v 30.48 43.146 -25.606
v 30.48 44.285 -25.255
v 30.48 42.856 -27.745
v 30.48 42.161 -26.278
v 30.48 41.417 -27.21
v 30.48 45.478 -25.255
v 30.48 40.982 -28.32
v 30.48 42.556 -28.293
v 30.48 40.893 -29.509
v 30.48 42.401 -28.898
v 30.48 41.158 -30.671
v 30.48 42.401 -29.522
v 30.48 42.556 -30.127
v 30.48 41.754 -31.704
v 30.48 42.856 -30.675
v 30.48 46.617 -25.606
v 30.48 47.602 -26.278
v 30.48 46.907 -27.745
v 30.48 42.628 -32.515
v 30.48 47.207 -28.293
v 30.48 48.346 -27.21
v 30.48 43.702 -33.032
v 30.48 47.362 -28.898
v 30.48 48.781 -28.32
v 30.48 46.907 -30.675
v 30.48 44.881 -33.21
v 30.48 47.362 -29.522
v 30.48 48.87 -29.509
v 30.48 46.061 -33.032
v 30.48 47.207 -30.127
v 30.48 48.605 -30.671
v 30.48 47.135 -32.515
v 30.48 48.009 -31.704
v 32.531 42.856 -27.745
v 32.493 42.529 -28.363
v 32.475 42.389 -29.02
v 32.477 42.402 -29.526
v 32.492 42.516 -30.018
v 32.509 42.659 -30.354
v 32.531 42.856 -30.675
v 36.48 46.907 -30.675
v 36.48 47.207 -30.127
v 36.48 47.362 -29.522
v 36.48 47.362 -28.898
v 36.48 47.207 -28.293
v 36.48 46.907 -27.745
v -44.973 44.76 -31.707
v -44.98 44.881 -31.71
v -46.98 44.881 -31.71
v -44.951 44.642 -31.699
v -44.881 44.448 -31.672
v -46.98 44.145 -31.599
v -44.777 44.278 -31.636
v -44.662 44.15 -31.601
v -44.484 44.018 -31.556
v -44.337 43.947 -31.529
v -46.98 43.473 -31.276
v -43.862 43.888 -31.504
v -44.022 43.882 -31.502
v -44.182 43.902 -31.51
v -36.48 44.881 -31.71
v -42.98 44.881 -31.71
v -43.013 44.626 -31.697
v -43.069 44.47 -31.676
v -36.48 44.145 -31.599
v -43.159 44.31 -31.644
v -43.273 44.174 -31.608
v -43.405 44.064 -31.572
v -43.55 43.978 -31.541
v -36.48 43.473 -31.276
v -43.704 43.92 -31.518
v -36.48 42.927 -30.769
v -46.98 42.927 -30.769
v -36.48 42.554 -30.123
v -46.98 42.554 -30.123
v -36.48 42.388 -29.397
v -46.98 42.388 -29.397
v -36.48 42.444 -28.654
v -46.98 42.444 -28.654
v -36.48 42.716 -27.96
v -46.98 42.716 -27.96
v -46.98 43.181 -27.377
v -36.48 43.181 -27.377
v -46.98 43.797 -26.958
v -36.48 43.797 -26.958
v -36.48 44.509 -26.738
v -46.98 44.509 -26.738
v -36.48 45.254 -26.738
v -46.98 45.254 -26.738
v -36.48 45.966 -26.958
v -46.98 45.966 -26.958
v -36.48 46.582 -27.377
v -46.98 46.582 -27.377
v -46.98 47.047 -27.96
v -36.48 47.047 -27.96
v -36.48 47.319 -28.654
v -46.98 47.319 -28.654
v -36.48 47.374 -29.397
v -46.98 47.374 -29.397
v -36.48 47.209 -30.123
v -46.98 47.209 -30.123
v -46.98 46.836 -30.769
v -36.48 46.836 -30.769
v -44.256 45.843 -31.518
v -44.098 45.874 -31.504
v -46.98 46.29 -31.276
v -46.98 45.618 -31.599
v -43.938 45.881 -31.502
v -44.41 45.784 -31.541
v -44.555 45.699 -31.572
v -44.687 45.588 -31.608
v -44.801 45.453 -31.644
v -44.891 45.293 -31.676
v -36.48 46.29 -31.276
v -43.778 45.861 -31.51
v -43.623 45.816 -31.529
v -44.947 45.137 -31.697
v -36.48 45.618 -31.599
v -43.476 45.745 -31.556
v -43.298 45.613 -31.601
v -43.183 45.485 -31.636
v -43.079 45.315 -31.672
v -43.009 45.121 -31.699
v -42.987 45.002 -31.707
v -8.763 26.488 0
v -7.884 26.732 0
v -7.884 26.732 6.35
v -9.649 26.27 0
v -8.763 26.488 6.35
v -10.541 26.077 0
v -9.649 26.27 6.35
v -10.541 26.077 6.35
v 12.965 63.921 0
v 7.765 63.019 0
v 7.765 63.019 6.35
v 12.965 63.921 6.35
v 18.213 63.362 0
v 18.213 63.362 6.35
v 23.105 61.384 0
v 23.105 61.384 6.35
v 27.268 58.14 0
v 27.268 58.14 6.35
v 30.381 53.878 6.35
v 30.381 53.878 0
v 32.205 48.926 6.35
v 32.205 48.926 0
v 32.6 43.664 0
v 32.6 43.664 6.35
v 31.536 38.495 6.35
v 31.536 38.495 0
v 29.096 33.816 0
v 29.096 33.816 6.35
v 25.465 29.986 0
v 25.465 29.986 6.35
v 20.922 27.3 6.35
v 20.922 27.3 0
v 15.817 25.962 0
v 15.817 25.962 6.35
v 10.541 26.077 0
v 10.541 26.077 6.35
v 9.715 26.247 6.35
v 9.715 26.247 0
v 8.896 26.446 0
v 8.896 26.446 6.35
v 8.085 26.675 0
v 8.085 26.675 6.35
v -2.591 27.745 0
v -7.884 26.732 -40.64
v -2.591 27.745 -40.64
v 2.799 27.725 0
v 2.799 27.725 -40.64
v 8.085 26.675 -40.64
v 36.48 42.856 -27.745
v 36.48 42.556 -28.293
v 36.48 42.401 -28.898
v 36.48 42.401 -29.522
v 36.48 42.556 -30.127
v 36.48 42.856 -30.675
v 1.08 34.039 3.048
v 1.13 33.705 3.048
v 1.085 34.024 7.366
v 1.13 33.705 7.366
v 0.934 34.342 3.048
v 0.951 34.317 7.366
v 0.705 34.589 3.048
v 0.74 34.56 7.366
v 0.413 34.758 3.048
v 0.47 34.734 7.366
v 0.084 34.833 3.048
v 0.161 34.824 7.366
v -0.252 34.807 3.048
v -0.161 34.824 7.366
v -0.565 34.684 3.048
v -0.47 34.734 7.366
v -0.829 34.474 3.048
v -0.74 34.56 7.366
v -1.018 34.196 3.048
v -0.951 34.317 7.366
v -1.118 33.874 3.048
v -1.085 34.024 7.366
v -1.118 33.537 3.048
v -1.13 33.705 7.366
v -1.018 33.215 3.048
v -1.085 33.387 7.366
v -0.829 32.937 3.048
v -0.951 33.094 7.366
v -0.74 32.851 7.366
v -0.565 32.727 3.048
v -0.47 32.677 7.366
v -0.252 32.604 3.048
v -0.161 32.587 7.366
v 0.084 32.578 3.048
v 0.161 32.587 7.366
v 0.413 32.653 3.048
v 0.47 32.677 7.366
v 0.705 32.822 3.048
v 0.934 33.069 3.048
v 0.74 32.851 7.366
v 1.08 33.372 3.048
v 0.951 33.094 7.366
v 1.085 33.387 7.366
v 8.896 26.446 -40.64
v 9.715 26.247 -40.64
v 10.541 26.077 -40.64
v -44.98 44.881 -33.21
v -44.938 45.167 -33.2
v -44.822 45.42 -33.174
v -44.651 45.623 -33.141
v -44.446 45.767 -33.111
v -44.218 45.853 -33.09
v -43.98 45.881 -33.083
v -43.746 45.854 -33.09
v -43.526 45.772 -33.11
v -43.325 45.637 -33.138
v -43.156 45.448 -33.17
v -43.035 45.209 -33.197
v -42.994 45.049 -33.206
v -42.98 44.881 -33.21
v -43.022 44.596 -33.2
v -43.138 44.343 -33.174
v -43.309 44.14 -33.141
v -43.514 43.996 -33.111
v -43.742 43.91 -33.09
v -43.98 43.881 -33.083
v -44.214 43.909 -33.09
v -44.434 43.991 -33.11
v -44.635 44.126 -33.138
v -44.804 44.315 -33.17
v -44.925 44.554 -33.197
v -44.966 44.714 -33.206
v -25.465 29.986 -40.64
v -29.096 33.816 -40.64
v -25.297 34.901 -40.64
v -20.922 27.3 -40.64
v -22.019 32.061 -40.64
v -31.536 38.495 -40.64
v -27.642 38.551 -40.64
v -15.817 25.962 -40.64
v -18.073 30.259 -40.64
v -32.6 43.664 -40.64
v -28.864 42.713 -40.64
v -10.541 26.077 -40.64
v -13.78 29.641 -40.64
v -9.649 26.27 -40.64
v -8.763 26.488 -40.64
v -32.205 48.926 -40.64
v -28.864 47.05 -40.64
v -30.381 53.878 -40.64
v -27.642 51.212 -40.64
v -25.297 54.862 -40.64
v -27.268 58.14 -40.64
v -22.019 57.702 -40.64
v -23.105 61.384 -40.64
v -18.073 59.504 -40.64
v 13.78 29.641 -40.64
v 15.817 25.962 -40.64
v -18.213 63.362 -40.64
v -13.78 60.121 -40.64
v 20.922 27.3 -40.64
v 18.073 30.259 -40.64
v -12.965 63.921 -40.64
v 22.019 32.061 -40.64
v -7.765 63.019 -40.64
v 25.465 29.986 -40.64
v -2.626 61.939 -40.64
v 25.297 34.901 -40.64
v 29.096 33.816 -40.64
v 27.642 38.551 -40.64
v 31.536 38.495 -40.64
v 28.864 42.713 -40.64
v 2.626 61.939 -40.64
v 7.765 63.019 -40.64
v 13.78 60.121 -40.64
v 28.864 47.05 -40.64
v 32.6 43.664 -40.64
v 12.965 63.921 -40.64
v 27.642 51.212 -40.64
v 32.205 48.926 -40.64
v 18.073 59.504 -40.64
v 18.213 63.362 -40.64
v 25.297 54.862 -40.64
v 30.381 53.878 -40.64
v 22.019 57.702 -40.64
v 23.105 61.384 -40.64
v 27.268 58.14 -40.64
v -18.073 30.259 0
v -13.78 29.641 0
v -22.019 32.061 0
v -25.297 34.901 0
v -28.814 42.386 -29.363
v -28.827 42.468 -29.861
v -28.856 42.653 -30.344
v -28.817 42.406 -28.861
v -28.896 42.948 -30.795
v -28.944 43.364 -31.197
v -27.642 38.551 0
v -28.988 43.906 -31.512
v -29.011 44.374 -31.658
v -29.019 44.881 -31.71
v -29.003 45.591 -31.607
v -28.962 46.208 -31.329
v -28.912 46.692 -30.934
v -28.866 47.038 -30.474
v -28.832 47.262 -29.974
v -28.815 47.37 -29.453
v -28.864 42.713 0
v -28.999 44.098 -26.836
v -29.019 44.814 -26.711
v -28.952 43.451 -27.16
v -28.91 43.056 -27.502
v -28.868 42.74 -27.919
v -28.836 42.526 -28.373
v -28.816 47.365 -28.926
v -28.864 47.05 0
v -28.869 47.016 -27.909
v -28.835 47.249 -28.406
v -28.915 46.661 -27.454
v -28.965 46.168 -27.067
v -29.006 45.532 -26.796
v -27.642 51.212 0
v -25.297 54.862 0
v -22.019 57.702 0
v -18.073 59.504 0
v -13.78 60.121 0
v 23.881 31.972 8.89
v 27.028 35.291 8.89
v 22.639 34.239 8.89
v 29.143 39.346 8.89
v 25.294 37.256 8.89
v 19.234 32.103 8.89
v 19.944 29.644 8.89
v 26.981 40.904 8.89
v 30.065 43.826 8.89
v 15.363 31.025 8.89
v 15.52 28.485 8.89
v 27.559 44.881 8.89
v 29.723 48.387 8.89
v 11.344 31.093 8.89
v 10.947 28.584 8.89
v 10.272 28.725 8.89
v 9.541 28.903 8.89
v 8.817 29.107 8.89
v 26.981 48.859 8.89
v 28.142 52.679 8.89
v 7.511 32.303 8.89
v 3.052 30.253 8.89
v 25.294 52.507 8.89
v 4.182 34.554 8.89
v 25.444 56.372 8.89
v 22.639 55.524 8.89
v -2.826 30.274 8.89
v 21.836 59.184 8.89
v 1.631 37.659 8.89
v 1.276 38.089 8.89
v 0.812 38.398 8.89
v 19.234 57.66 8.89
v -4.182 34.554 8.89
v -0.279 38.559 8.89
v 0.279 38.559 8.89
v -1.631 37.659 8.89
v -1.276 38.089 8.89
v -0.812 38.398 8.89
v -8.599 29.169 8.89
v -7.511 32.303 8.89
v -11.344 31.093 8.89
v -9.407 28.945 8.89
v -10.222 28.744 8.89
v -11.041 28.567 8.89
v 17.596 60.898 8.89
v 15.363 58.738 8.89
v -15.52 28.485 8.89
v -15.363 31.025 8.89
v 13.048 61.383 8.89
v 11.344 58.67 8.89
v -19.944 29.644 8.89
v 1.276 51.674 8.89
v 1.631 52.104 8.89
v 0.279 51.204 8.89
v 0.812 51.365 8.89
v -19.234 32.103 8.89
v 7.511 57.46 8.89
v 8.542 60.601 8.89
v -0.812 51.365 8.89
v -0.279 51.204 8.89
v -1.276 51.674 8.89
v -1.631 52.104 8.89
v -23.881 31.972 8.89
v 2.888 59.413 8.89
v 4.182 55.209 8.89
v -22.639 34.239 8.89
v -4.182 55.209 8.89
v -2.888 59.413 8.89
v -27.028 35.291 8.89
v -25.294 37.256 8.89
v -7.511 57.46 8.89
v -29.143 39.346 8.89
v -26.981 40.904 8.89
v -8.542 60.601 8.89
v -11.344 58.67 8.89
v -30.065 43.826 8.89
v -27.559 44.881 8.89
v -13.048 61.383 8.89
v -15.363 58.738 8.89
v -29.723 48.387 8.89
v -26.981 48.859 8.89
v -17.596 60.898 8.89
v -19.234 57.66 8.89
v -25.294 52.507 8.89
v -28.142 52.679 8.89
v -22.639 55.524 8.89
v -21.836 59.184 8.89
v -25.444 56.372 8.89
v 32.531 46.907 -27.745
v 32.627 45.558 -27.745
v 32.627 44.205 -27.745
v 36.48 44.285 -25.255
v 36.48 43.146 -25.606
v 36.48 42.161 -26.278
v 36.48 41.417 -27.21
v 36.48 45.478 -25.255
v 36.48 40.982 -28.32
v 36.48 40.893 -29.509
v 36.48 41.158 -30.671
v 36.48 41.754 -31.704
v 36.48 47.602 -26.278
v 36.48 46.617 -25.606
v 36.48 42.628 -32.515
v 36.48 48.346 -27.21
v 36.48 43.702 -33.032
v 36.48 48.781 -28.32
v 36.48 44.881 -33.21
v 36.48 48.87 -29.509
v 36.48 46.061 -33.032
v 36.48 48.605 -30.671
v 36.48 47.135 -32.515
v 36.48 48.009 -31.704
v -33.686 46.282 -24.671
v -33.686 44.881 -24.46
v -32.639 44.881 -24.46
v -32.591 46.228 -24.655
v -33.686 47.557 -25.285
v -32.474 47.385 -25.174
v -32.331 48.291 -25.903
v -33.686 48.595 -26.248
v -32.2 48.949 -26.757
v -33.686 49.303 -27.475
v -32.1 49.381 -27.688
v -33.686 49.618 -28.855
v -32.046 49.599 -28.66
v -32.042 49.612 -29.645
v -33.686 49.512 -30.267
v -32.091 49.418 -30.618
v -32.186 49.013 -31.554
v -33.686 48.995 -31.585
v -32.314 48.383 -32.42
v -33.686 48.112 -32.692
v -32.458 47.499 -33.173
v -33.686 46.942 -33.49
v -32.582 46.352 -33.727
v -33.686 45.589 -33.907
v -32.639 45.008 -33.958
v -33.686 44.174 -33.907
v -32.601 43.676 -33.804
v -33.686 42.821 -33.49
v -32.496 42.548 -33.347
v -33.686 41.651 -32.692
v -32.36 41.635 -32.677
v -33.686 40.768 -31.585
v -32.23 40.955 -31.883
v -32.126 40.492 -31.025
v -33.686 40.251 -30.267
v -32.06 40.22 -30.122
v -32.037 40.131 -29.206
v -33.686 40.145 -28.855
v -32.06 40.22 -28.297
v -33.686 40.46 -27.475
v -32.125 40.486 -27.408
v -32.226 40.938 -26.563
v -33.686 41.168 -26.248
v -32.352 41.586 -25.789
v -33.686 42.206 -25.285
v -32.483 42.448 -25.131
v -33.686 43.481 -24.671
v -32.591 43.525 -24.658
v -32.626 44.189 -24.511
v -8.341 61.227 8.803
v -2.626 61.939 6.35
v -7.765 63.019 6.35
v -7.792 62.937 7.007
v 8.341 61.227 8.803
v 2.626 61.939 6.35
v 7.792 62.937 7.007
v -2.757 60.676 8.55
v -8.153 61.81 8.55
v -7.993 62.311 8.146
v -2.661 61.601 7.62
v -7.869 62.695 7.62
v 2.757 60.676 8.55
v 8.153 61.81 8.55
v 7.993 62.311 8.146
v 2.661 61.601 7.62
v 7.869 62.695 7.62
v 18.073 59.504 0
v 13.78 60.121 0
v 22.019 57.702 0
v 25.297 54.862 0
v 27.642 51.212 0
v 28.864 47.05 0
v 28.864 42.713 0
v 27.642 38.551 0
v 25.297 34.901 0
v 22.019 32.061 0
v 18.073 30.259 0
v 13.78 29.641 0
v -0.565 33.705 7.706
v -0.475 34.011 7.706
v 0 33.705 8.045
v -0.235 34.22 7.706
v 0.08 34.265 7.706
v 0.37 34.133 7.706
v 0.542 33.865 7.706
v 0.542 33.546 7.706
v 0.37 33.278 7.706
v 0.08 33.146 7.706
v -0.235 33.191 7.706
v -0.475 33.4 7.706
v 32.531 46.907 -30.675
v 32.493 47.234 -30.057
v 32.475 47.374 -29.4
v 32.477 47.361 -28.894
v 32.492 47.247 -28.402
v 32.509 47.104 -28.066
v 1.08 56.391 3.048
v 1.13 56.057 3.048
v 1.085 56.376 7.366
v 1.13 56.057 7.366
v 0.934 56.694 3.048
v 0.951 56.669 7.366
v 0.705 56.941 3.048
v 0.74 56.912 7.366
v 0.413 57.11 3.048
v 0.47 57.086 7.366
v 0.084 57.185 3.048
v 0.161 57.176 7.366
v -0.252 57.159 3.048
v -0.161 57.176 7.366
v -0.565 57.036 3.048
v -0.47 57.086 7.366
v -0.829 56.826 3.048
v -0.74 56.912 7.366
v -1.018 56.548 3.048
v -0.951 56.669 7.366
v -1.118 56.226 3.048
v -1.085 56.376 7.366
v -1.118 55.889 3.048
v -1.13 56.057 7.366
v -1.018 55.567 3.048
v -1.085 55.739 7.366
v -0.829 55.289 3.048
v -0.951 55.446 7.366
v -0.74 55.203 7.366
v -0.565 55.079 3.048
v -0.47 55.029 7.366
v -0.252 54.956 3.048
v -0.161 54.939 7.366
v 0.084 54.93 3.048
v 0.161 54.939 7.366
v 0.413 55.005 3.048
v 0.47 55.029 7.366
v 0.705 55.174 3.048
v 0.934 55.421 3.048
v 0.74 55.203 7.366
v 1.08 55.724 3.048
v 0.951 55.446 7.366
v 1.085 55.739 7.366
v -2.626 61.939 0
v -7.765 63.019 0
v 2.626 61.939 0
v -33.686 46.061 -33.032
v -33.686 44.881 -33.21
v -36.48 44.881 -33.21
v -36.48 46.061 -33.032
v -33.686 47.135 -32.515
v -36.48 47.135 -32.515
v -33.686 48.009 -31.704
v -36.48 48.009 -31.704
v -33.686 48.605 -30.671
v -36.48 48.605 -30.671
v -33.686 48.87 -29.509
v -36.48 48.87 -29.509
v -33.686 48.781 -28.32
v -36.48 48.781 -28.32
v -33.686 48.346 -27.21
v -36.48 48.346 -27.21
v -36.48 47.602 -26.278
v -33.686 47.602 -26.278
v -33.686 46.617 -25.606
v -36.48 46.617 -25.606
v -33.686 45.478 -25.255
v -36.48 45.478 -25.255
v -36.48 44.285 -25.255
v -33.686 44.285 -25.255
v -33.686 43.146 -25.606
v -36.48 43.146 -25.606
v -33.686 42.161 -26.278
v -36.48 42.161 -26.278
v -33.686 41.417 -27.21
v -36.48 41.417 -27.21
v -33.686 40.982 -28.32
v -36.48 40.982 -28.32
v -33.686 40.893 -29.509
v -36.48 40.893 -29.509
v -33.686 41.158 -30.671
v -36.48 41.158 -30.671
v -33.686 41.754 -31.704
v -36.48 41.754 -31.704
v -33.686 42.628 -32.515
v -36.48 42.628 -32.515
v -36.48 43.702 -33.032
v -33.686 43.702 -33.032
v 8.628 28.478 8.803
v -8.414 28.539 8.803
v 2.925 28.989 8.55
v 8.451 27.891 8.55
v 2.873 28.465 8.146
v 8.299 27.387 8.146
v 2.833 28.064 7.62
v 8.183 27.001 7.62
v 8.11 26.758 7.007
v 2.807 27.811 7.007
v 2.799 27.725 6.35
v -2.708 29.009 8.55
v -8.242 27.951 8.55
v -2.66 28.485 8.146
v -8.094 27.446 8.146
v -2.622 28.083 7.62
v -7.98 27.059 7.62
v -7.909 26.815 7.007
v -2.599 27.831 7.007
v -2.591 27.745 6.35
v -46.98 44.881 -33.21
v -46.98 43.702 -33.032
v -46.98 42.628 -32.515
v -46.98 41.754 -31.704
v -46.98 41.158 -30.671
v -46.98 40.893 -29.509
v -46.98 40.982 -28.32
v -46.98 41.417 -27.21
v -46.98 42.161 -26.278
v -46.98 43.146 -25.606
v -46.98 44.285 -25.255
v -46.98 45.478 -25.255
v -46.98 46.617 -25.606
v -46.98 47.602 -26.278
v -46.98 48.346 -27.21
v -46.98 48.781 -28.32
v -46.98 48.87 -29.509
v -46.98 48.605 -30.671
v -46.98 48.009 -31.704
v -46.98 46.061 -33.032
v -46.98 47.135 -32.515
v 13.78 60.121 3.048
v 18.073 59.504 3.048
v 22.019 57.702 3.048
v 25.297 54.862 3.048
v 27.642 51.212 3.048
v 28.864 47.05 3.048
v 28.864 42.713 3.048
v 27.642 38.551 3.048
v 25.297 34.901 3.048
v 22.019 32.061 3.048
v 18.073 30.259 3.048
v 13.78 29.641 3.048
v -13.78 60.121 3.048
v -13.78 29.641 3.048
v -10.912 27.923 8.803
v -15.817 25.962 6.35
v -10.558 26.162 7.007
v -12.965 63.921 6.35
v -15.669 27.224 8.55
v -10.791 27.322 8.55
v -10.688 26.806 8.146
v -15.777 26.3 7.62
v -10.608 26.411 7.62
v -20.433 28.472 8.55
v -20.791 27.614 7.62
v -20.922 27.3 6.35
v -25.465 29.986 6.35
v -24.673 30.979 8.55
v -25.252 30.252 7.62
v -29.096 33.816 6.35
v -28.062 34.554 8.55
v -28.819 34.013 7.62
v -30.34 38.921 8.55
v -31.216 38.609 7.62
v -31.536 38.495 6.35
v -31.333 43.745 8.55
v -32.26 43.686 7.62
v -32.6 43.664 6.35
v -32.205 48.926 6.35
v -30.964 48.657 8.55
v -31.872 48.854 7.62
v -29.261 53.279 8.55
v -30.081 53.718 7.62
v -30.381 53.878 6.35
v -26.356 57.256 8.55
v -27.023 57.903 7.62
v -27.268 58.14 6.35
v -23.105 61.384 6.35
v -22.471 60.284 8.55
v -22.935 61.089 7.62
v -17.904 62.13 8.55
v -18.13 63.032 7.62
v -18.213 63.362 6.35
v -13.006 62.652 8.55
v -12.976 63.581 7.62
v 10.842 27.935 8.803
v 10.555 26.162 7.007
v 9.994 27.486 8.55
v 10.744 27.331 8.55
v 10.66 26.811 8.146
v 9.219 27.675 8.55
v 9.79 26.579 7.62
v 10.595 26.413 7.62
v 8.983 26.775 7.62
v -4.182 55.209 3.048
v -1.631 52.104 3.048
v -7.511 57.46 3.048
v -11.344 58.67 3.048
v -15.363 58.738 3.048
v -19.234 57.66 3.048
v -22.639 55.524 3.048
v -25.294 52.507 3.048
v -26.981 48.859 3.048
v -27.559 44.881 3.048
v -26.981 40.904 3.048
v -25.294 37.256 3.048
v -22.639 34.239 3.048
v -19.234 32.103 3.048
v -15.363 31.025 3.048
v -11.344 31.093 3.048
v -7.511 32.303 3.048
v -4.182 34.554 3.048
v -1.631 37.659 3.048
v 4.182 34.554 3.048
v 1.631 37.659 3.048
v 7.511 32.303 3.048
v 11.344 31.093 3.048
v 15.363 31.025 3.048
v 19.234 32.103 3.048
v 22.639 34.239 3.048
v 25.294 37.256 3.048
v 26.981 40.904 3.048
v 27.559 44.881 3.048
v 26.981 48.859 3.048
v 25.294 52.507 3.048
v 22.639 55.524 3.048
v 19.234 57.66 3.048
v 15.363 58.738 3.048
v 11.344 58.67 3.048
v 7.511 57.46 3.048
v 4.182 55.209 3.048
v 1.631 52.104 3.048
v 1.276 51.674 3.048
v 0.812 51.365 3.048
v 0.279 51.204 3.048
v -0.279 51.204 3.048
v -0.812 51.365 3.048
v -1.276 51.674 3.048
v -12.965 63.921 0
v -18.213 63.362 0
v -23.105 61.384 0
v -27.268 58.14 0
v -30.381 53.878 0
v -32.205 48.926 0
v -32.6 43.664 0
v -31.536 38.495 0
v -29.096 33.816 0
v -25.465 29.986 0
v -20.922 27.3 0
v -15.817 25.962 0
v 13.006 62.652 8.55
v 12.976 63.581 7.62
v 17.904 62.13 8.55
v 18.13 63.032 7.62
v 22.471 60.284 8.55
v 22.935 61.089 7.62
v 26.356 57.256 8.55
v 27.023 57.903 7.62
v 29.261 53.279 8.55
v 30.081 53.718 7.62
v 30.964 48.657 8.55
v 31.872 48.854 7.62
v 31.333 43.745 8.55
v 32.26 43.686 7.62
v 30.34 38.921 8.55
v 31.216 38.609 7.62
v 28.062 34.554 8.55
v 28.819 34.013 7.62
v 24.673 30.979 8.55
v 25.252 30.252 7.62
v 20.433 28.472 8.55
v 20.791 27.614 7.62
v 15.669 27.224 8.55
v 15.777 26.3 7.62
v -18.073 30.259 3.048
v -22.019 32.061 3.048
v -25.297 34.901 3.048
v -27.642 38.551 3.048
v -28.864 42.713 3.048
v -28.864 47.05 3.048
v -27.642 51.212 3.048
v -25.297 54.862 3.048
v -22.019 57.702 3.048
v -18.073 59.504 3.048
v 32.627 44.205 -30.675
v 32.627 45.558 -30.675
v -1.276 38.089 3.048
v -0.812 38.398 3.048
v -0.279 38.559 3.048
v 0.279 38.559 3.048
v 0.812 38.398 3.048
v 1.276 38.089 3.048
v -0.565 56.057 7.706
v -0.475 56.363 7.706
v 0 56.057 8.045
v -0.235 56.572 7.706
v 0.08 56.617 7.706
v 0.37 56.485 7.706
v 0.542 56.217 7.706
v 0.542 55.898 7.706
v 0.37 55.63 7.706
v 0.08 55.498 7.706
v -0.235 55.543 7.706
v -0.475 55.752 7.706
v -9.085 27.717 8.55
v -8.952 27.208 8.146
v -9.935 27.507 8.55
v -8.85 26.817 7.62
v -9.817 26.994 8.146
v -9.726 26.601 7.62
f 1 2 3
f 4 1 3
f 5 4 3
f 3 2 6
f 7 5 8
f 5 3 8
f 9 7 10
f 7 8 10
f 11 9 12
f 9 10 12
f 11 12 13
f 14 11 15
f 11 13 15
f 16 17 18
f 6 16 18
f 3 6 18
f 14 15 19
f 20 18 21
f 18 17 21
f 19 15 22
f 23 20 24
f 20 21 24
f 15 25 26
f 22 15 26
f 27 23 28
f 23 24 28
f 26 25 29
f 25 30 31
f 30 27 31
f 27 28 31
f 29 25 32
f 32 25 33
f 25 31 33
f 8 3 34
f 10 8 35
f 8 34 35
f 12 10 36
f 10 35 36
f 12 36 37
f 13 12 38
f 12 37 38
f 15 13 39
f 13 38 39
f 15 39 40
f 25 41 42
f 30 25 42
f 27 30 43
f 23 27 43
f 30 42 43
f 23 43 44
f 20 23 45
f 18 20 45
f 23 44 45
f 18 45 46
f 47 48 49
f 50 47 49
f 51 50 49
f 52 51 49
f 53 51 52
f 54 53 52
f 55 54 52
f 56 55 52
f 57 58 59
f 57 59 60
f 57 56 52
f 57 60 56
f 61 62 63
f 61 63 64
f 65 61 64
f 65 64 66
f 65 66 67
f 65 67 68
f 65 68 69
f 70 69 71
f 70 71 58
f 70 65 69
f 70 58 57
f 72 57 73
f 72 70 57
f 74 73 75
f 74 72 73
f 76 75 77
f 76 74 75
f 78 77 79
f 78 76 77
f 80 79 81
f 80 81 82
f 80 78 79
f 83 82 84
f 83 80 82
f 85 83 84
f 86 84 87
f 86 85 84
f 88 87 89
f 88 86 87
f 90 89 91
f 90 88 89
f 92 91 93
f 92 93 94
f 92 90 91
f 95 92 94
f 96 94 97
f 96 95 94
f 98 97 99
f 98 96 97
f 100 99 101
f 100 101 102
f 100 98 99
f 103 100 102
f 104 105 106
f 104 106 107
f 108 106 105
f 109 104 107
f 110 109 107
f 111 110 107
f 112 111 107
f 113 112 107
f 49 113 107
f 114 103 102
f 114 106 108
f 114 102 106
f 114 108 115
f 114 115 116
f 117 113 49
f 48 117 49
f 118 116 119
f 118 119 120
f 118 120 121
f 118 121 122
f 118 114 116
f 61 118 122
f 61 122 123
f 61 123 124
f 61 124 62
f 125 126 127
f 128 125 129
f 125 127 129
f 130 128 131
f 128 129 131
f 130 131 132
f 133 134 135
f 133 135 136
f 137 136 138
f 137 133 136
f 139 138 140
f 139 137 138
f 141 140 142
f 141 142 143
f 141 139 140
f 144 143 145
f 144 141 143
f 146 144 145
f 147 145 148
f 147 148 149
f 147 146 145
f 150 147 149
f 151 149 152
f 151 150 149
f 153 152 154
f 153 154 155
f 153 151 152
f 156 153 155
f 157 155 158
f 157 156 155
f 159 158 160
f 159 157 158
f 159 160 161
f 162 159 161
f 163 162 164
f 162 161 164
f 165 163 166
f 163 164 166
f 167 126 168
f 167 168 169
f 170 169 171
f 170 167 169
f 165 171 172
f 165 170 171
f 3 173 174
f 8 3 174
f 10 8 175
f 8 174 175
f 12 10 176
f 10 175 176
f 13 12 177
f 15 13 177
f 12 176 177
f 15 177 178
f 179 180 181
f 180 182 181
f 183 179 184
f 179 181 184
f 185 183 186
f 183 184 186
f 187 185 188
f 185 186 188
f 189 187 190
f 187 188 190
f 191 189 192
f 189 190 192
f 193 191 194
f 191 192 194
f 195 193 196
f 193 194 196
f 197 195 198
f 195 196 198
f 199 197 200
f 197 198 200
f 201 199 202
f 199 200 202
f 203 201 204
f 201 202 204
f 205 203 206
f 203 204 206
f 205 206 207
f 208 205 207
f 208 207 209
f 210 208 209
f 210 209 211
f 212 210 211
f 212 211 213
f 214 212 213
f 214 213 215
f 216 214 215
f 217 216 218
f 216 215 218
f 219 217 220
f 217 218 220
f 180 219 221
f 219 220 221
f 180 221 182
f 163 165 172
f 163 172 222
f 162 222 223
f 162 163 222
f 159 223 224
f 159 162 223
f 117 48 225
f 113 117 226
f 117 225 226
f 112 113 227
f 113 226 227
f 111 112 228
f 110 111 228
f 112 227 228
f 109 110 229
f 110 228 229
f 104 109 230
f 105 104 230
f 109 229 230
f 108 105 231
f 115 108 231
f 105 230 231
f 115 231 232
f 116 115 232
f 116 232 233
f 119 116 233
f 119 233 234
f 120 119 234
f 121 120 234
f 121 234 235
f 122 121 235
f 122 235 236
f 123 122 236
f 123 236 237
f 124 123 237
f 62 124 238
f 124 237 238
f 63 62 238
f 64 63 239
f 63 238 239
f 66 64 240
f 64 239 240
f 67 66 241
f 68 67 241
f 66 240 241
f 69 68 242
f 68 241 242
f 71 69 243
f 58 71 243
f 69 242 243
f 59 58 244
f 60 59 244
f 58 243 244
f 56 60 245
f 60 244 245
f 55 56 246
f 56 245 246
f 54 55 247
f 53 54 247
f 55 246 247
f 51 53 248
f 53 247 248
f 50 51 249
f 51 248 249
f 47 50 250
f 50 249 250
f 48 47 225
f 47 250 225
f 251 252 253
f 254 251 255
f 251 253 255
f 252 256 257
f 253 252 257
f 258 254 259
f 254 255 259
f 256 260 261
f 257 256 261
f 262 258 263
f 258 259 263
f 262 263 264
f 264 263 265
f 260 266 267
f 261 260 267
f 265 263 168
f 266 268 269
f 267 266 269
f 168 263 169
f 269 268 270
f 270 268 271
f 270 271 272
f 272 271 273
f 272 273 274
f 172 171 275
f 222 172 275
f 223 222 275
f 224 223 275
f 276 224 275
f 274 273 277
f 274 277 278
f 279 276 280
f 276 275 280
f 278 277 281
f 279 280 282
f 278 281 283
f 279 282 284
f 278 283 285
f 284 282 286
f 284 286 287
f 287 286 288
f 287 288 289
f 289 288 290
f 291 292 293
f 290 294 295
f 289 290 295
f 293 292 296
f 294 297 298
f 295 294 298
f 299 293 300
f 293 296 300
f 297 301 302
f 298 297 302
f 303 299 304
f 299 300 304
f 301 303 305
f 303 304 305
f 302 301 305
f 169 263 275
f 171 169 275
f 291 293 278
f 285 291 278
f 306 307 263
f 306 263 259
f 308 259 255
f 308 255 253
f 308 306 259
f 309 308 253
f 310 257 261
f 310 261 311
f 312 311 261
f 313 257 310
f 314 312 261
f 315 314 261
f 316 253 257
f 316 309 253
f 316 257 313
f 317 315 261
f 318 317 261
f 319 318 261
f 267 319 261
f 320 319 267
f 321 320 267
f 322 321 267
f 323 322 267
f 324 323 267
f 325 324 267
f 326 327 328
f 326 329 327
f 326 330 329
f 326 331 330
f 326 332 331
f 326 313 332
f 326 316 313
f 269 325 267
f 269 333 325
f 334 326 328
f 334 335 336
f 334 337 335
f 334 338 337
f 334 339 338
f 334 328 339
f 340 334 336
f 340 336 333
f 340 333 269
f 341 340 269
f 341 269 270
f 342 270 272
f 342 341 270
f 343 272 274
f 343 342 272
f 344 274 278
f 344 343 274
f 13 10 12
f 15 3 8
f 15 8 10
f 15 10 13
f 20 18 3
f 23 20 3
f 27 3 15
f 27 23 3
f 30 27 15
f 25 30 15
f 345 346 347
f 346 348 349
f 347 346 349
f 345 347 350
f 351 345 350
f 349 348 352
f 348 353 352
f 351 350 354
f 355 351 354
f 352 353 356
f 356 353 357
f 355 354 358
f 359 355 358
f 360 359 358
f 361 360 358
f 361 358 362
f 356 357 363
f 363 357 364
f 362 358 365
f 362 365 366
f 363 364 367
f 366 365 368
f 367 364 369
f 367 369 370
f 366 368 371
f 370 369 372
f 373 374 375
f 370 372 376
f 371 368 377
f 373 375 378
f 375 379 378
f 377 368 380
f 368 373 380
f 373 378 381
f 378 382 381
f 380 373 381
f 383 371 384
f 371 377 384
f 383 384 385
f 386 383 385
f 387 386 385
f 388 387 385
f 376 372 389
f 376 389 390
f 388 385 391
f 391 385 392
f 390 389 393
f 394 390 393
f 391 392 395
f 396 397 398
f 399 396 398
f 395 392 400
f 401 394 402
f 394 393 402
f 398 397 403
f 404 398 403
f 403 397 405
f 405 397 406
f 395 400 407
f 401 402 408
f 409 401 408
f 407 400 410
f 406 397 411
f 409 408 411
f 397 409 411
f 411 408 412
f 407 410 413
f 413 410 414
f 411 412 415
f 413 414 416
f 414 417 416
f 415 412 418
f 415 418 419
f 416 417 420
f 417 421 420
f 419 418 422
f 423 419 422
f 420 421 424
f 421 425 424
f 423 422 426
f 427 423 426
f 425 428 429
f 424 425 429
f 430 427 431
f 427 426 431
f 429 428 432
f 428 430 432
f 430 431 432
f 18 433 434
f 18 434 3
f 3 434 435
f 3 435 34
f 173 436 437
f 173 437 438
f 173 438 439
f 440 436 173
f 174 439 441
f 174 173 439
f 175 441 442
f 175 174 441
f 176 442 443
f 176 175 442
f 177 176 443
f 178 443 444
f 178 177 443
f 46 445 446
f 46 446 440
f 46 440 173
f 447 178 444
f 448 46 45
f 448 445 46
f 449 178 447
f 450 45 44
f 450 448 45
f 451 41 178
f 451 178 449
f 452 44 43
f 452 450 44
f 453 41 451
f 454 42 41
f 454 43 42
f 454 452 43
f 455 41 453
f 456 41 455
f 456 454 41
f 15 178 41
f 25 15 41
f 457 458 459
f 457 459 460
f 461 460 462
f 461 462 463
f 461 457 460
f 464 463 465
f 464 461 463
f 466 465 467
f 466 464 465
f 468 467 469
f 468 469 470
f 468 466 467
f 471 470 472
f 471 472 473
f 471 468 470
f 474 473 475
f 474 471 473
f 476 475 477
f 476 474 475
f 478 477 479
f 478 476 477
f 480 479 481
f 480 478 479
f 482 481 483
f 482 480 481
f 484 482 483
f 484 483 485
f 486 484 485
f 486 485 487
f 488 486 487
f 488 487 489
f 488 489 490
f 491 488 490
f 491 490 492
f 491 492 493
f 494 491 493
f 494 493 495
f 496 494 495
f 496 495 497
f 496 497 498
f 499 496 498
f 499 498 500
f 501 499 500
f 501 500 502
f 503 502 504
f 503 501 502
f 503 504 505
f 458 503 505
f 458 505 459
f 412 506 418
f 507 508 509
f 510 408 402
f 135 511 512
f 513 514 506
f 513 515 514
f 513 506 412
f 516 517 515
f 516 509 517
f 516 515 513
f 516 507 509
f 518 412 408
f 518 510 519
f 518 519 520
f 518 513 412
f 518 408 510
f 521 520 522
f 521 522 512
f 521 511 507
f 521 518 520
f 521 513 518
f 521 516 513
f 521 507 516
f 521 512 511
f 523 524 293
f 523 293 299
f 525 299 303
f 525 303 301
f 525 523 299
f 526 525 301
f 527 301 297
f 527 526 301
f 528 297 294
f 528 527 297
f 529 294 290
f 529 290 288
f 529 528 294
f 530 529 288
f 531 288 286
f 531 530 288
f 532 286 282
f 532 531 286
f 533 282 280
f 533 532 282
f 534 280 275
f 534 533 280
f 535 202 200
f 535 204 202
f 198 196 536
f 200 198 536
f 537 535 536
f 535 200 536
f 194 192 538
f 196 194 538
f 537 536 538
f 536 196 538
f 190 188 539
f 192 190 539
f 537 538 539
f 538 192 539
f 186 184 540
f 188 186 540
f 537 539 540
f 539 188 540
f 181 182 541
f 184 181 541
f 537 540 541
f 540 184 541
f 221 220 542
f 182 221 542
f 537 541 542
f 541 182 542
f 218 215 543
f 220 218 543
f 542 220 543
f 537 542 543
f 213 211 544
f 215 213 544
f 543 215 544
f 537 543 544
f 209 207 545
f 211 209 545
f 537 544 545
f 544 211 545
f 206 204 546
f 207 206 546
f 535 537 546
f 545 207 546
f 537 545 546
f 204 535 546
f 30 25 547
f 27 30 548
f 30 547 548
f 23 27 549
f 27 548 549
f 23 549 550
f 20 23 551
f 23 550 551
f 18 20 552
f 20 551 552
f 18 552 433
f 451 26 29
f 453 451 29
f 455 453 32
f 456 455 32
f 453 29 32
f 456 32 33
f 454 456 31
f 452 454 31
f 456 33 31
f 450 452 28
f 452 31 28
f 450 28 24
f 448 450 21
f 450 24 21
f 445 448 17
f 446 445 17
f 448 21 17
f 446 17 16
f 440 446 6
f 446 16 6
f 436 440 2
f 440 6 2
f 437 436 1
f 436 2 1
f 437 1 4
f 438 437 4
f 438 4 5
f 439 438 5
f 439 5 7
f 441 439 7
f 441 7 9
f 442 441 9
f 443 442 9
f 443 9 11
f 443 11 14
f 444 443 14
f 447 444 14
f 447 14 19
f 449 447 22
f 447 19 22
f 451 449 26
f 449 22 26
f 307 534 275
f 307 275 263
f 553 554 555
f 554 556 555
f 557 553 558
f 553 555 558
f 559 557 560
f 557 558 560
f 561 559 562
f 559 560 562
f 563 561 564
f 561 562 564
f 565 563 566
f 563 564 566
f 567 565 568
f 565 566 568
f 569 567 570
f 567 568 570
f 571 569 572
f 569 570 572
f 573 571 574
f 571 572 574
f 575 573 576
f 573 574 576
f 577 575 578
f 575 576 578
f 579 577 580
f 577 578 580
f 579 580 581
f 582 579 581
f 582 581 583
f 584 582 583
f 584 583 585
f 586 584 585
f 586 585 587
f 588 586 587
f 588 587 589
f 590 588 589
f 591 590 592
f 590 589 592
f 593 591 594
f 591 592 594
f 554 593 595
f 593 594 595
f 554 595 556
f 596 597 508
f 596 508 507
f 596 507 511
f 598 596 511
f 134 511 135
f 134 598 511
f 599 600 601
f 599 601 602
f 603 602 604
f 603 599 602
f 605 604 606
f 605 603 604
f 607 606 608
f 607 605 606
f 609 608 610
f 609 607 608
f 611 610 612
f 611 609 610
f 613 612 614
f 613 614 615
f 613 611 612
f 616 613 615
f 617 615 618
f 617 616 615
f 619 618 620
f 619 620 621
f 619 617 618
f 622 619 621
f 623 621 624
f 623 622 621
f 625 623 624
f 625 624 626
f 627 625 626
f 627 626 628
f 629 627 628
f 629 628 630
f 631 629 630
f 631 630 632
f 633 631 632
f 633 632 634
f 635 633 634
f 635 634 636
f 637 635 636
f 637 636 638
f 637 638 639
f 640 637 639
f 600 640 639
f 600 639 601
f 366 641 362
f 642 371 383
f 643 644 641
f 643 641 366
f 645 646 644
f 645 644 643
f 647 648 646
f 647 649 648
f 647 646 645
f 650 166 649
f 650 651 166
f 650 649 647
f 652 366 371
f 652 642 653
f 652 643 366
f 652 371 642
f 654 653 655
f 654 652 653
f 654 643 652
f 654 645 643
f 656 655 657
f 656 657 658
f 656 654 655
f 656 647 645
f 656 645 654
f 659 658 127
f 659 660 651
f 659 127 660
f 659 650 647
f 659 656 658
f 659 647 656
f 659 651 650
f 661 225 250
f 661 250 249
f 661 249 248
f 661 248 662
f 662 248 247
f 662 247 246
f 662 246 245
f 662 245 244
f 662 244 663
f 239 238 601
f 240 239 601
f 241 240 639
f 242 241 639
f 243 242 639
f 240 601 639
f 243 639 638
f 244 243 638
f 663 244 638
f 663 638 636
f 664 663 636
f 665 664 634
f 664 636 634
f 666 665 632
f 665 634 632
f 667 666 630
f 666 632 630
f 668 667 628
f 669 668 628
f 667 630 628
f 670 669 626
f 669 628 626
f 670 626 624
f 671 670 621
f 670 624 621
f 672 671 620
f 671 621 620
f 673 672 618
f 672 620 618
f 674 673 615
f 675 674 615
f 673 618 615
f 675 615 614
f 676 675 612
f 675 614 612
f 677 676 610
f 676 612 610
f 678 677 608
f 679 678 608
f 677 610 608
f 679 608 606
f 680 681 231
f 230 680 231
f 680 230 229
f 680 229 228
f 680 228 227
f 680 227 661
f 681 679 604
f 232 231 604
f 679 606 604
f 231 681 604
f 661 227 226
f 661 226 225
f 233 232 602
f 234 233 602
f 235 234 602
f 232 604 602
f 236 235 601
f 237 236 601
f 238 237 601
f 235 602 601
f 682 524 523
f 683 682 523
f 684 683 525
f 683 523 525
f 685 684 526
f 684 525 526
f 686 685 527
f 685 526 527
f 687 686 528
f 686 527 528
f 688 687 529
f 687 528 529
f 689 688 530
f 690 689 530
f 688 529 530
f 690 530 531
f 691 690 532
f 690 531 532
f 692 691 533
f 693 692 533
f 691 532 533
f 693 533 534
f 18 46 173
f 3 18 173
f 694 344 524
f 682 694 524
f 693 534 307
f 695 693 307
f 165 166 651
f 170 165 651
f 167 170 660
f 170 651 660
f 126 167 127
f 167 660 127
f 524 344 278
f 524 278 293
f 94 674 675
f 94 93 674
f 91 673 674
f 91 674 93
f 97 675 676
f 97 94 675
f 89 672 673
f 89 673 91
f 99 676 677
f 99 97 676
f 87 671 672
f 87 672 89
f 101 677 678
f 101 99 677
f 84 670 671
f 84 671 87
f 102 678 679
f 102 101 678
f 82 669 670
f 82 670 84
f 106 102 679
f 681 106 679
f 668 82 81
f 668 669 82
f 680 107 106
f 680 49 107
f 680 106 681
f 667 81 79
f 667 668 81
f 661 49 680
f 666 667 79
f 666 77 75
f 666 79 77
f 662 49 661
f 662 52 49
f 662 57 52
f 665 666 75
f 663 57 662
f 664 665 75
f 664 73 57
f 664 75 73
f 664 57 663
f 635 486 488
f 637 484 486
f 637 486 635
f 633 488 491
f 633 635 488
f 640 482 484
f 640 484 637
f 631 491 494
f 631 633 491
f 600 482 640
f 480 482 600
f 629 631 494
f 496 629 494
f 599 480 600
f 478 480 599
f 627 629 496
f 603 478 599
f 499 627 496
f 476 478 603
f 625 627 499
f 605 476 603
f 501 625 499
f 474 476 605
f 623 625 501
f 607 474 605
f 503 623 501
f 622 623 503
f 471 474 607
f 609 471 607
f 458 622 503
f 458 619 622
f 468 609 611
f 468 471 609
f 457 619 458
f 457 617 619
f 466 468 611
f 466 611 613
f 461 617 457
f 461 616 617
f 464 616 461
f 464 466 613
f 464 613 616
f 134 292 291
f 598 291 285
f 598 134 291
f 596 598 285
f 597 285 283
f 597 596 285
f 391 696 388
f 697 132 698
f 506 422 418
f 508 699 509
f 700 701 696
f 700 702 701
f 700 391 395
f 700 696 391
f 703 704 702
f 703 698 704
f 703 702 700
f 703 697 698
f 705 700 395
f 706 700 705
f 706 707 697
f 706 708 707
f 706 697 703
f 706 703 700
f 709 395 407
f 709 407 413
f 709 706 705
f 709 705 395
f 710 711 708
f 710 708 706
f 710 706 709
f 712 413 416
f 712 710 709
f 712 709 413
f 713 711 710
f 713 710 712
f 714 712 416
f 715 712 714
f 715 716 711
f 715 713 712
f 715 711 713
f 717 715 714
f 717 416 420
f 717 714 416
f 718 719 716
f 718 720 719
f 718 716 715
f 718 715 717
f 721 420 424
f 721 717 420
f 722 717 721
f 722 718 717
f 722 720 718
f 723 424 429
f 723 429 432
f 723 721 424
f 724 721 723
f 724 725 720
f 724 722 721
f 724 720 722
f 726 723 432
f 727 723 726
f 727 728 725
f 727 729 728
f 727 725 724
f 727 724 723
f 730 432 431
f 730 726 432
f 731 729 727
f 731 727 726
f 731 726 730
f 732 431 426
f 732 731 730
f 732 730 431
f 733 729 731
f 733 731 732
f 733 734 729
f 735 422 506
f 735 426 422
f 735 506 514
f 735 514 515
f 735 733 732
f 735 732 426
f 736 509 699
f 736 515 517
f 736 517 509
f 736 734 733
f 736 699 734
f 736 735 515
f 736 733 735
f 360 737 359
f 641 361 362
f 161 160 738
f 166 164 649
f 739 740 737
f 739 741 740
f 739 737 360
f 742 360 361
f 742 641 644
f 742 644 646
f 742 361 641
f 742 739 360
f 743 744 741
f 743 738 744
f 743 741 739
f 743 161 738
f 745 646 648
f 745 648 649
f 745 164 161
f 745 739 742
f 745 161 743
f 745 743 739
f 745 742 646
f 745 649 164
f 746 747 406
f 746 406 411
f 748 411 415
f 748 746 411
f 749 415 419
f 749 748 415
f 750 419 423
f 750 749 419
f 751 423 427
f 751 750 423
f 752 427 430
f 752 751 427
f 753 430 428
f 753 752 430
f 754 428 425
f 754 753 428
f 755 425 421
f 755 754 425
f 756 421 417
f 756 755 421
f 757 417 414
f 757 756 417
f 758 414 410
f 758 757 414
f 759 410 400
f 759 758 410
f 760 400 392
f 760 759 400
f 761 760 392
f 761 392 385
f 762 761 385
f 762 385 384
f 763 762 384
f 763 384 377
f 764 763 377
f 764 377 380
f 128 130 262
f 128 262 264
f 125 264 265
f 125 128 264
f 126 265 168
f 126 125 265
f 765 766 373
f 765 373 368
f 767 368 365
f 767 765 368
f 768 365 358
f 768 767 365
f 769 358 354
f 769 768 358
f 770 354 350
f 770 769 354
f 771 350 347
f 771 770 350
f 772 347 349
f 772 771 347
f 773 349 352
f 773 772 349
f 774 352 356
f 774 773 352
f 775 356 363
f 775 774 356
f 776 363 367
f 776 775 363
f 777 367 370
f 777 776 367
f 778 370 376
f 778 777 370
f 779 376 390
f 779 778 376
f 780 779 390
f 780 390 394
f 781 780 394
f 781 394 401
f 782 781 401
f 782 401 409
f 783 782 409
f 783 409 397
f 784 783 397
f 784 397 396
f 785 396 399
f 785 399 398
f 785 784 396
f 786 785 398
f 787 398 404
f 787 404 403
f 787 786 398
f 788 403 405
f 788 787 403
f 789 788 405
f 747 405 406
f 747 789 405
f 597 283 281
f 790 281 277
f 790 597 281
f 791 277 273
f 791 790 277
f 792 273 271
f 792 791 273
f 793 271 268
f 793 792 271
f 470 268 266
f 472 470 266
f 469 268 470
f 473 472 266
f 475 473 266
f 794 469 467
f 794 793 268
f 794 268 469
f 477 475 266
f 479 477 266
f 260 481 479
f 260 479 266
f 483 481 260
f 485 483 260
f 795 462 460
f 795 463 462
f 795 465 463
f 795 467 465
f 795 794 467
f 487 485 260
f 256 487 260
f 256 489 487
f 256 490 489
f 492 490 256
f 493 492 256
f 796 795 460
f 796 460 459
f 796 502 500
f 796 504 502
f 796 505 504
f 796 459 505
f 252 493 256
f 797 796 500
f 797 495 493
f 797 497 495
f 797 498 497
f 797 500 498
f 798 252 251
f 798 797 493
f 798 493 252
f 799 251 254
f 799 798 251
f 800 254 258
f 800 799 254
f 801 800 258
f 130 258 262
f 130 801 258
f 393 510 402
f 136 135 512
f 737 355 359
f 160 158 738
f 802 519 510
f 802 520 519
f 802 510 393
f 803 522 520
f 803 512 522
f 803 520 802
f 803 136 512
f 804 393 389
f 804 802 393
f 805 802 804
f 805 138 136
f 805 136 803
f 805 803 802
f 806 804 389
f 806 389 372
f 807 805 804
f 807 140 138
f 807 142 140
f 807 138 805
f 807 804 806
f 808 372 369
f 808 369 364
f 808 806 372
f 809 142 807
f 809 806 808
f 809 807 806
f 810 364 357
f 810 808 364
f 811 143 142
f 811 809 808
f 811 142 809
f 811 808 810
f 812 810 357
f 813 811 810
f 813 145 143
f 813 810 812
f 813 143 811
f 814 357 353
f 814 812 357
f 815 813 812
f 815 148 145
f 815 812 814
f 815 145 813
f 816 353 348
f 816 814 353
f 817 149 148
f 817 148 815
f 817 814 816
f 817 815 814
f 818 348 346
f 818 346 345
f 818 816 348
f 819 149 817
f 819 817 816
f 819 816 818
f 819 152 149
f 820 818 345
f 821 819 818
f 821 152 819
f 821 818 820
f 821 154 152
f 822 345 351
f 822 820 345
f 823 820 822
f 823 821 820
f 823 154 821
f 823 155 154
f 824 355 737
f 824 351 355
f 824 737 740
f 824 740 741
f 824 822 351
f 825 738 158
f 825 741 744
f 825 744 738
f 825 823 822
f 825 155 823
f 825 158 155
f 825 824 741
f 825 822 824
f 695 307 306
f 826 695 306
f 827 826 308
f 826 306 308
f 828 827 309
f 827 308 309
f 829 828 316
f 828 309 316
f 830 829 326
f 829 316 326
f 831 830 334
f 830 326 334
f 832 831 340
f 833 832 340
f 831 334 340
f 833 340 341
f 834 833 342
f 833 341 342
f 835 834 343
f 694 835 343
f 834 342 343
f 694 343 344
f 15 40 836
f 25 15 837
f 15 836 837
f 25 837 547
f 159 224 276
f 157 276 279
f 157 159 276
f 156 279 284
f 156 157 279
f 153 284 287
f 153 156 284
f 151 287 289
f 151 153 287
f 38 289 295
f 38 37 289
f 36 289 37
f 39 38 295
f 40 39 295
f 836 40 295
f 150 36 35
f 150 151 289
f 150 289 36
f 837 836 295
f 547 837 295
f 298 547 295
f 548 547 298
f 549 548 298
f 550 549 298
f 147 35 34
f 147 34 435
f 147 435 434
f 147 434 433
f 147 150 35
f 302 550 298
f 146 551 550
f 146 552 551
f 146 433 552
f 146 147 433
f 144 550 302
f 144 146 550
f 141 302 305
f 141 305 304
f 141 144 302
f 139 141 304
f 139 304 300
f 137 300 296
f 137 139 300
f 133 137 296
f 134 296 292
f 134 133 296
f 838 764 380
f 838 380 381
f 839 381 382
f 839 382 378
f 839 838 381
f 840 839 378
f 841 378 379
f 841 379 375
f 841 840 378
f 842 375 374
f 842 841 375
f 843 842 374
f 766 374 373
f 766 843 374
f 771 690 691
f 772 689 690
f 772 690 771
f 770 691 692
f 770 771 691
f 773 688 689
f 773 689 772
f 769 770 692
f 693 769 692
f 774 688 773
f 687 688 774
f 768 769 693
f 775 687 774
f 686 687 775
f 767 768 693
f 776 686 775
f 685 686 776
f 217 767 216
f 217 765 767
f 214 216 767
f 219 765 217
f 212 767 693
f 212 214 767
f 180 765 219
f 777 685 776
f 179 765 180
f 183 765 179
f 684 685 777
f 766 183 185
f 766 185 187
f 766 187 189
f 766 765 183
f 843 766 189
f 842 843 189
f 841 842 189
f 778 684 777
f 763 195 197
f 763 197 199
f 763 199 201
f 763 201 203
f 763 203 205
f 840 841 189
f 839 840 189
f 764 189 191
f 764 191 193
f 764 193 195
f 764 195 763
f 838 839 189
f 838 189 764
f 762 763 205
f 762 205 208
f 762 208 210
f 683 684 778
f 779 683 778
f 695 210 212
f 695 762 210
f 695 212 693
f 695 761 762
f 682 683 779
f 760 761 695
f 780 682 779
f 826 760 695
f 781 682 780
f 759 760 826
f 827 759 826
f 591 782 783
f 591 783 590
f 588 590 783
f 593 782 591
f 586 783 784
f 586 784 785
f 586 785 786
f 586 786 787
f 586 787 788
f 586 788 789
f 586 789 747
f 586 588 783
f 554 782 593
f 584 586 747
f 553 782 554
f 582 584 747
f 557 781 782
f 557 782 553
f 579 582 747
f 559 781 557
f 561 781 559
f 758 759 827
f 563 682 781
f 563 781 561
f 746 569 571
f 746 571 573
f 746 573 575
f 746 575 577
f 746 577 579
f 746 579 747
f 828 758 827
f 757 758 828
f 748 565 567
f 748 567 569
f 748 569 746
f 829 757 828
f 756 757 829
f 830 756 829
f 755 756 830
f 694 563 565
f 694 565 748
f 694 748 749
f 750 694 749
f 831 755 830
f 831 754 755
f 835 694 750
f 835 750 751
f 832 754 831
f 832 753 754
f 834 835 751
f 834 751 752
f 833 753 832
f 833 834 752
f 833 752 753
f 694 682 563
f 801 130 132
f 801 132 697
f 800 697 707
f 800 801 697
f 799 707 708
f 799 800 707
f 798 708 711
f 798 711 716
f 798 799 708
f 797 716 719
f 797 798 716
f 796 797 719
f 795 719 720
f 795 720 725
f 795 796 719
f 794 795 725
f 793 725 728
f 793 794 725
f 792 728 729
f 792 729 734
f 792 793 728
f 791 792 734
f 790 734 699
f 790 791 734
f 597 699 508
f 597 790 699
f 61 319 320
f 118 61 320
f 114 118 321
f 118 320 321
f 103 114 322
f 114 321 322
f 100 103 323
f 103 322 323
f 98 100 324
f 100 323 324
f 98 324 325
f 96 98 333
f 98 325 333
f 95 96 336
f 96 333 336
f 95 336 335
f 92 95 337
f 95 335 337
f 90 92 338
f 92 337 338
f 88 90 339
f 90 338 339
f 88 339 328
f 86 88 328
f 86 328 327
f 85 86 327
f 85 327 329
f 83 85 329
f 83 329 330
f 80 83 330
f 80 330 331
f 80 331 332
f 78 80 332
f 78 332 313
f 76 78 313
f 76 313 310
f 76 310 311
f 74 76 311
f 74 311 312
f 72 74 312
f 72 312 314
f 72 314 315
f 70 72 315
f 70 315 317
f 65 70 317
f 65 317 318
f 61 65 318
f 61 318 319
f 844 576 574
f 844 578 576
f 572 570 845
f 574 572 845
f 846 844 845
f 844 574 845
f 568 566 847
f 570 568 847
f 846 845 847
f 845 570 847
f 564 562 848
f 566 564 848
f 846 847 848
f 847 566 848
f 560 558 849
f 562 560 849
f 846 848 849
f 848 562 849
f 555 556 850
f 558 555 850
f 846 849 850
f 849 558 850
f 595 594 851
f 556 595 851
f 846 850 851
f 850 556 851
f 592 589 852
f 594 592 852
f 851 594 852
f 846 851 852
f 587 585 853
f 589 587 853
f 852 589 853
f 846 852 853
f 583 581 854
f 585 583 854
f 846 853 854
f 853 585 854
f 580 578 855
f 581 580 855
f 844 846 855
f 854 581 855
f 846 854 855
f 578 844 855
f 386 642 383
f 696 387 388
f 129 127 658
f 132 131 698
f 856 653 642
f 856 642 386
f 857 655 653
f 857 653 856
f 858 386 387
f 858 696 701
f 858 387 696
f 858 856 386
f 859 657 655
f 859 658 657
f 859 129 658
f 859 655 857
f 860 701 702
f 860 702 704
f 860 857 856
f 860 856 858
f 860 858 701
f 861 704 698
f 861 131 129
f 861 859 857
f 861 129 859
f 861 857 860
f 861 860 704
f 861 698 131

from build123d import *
from build123d.topology import SkipClean

# Parameters (mm, degrees)
BOSS_EXTRUDE1_DEPTH       = 8.89
CUT_EXTRUDE1_DEPTH        = 3.048
F_4_40_TAPPED_HOLE1_D     = 2.2606
F_4_40_TAPPED_HOLE1_DEPTH = 4.318
F_4_40_TAPPED_HOLE1_TIP   = 0.679152758
CUT_EXTRUDE2_REACH        = 74.33
SKETCH14_R                = 1.8288
CUT_EXTRUDE3_DEPTH        = 38.862
BOSS_EXTRUDE3_START       = 40.64
BOSS_EXTRUDE3_DEPTH       = 40.64
BOSS_EXTRUDE4_START       = 30.48
SKETCH20_R                = 4
BOSS_EXTRUDE4_DEPTH       = 6
BOSS_EXTRUDE5_DEPTH       = 0.508
BOSS_EXTRUDE5_DEPTH_BACK  = 6
BOSS_EXTRUDE5_START       = -30.48
SKETCH20_2_R              = 4
CUT_EXTRUDE5_START        = -55.88
SKETCH21_R                = 2.5
CUT_EXTRUDE5_DEPTH        = 24.678
CUT_EXTRUDE6_DEPTH        = 6
BOSS_EXTRUDE6_START       = -2.794
SKETCH23_R                = 4.75
SKETCH23_R_2              = 3.596259124
BOSS_EXTRUDE6_DEPTH       = 3.984
SKETCH25_R                = 4
SKETCH25_R_2              = 2.5
BOSS_EXTRUDE7_DEPTH       = 10.500000034
SKETCH27_R                = 1
CUT_EXTRUDE7_DEPTH        = 9.666
FILLET6_R                 = 2.54


with BuildPart() as part:
    # Sketch3 → Boss-Extrude1 (new body)
    with BuildSketch(Plane.XY):
        with BuildLine():
            Line((27.94, 0), (-27.94, 0))
            Line((-27.94, 0), (-27.94, 3.302))
            ThreePointArc((-27.94, 3.302), (-27.196051224, 5.098051224), (-25.4, 5.842))
            Line((-25.4, 5.842), (-9.525, 5.842))
            ThreePointArc((-9.525, 5.842), (-5.034871939, 7.701871939), (-3.175, 12.192))
            Line((-3.175, 12.192), (-3.175, 19.808714252))
            ThreePointArc((-3.175, 19.808714252), (-5.409729657, 24.644730174), (-10.541, 26.076907293))
            ThreePointArc((-10.541, 26.076907293), (-32.585448492, 46.308877289), (-7.765142857, 63.019435252))
            ThreePointArc((-7.765142857, 63.019435252), (0, 61.803367034), (7.765142857, 63.019435252))
            ThreePointArc((7.765142857, 63.019435252), (32.585448492, 46.308877289), (10.541, 26.076907293))
            ThreePointArc((10.541, 26.076907293), (5.409729657, 24.644730174), (3.175, 19.808714252))
            Line((3.175, 19.808714252), (3.175, 12.192))
            ThreePointArc((3.175, 12.192), (5.034871939, 7.701871939), (9.525, 5.842))
            Line((9.525, 5.842), (25.4, 5.842))
            ThreePointArc((25.4, 5.842), (27.196051224, 5.098051224), (27.94, 3.302))
            Line((27.94, 3.302), (27.94, 0))
        make_face()
        with BuildLine():
            ThreePointArc((-1.63068, 52.103638642), (-27.559, 44.881486416), (-1.63068, 37.65933419))
            ThreePointArc((-1.63068, 37.65933419), (0, 38.57949525), (1.63068, 37.65933419))
            ThreePointArc((1.63068, 37.65933419), (27.559, 44.881486416), (1.63068, 52.103638642))
            ThreePointArc((1.63068, 52.103638642), (0, 51.183477582), (-1.63068, 52.103638642))
        make_face(mode=Mode.SUBTRACT)
    extrude(amount=BOSS_EXTRUDE1_DEPTH)

    # Sketch5 → Cut-Extrude1 (cut)
    with BuildSketch(Plane(origin=(0, 0, 0), x_dir=(-1, 0, 0), z_dir=(0, 0, -1))):
        with BuildLine():
            Line((13.7795, 60.121486416), (-13.7795, 60.121486416))
            ThreePointArc((-13.7795, 60.121486416), (-29.0195, 44.881486416), (-13.7795, 29.641486416))
            Line((-13.7795, 29.641486416), (13.7795, 29.641486416))
            ThreePointArc((13.7795, 29.641486416), (29.0195, 44.881486416), (13.7795, 60.121486416))
        make_face()
    extrude(amount=-CUT_EXTRUDE1_DEPTH, mode=Mode.SUBTRACT)

    # #4-40 Tapped Hole1
    with Locations(Plane(origin=(0, 0, 3.048), x_dir=(-1, 0, 0), z_dir=(0, 0, -1))):
        with Locations((0, 56.057486416), (0, 33.705486416)):
            Hole(F_4_40_TAPPED_HOLE1_D / 2, depth=F_4_40_TAPPED_HOLE1_DEPTH)
            with Locations((0, 0, -(F_4_40_TAPPED_HOLE1_DEPTH + F_4_40_TAPPED_HOLE1_TIP / 2))):  # 118° drill point
                Cone(0, F_4_40_TAPPED_HOLE1_D / 2, F_4_40_TAPPED_HOLE1_TIP, mode=Mode.SUBTRACT)

    # Sketch14 → Cut-Extrude2 (cut, up to next)
    with BuildSketch(Plane(origin=(0, 0, 0), x_dir=(-1, 0, 0), z_dir=(0, -1, 0)), mode=Mode.PRIVATE) as cut_extrude2_sk1:
        with Locations((22.225, -4.445)):
            Circle(SKETCH14_R)
    cut_extrude2_tool1 = extrude(cut_extrude2_sk1.sketch, amount=-CUT_EXTRUDE2_REACH, mode=Mode.PRIVATE) & part.part
    # Sketch14 → Cut-Extrude2 (cut, up to next)
    with BuildSketch(Plane(origin=(0, 0, 0), x_dir=(-1, 0, 0), z_dir=(0, -1, 0)), mode=Mode.PRIVATE) as cut_extrude2_sk2:
        with Locations((-22.225, -4.445)):
            Circle(SKETCH14_R)
    cut_extrude2_tool2 = extrude(cut_extrude2_sk2.sketch, amount=-CUT_EXTRUDE2_REACH, mode=Mode.PRIVATE) & part.part
    add(cut_extrude2_tool1.solids().sort_by_distance((-22.225, 0, 4.445))[0], mode=Mode.SUBTRACT)
    add(cut_extrude2_tool2.solids().sort_by_distance((22.225, 0, 4.445))[0], mode=Mode.SUBTRACT)

    # Sketch15 → Cut-Extrude3 (cut)
    with BuildSketch(Plane.XY.offset(8.89)):
        with BuildLine():
            Line((-10.541, 26.076907293), (-57.74295943, 0))
            Line((-57.74295943, 0), (-18.699372608, -16.511014467))
            Line((-18.699372608, -16.511014467), (69.238576279, -8.255507234))
            Line((69.238576279, -8.255507234), (10.541, 26.076907293))
            ThreePointArc((10.541, 26.076907293), (9.304936493, 26.342971235), (8.084902933, 26.674876531))
            ThreePointArc((8.084902933, 26.674876531), (0.10450601, 27.864681788), (-7.884211813, 26.732092214))
            ThreePointArc((-7.884211813, 26.732092214), (-9.205484653, 26.375622927), (-10.541, 26.076907293))
        make_face()
    extrude(amount=-CUT_EXTRUDE3_DEPTH, mode=Mode.SUBTRACT)

    # Sketch19 → Boss-Extrude3 (add)
    with SkipClean():  # the faces are left unmerged after this step: merging them gives an invalid solid
        with BuildSketch(Plane(origin=(0, 0, 0), x_dir=(-1, 0, 0), z_dir=(0, 0, -1)).offset(BOSS_EXTRUDE3_START)):
            with BuildLine():
                ThreePointArc((-7.765142857, 63.019435252), (0, 61.803367034), (7.765142857, 63.019435252))
                ThreePointArc((7.765142857, 63.019435252), (32.585448492, 46.308877289), (10.541, 26.076907293))
                ThreePointArc((10.541, 26.076907293), (9.205484653, 26.375622927), (7.884211813, 26.732092214))
                ThreePointArc((7.884211813, 26.732092214), (-0.10450601, 27.864681788), (-8.084902933, 26.674876531))
                ThreePointArc((-8.084902933, 26.674876531), (-9.304936493, 26.342971235), (-10.541, 26.076907293))
                ThreePointArc((-10.541, 26.076907293), (-32.585448492, 46.308877289), (-7.765142857, 63.019435252))
            make_face()
            with BuildLine():
                Line((-13.7795, 29.641486416), (13.7795, 29.641486416))
                ThreePointArc((13.7795, 29.641486416), (29.0195, 44.881486416), (13.7795, 60.121486416))
                Line((13.7795, 60.121486416), (-13.7795, 60.121486416))
                ThreePointArc((-13.7795, 60.121486416), (-29.0195, 44.881486416), (-13.7795, 29.641486416))
            make_face(mode=Mode.SUBTRACT)
        extrude(amount=-BOSS_EXTRUDE3_DEPTH)

    # Sketch20<2> → Boss-Extrude5 (add, two sides: drawn at the far end of the back side and taken through both)
    with SkipClean():  # the faces are left unmerged after this step: merging them gives an invalid solid
        with BuildSketch(Plane(origin=(0, 0, 0), x_dir=(0, 0, -1), z_dir=(1, 0, 0)).offset(BOSS_EXTRUDE5_START - BOSS_EXTRUDE5_DEPTH_BACK)):
            with Locations((29.21, 44.881486416)):
                Circle(SKETCH20_2_R)
        extrude(amount=BOSS_EXTRUDE5_DEPTH + BOSS_EXTRUDE5_DEPTH_BACK)

    # Sketch21 → Cut-Extrude5 (cut)
    with SkipClean():  # the faces are left unmerged after this step: merging them gives an invalid solid
        with BuildSketch(Plane(origin=(36.48, 0, 0), x_dir=(0, 0, -1), z_dir=(1, 0, 0)).offset(CUT_EXTRUDE5_START)):
            with Locations((29.21, 44.881486416)):
                Circle(SKETCH21_R)
        extrude(amount=-CUT_EXTRUDE5_DEPTH, mode=Mode.SUBTRACT)


with BuildPart() as body_2:
    # Sketch20 → Boss-Extrude4 (new body)
    with BuildSketch(Plane(origin=(0, 0, 0), x_dir=(0, 0, -1), z_dir=(1, 0, 0)).offset(BOSS_EXTRUDE4_START)):
        with Locations((29.21, 44.881486416)):
            Circle(SKETCH20_R)
    extrude(amount=BOSS_EXTRUDE4_DEPTH)


with BuildPart() as cut_extrude6_tool:
    # Sketch22 → Cut-Extrude6 (new body)
    with SkipClean():  # the faces are left unmerged after this step: merging them gives an invalid solid
        with BuildSketch(Plane(origin=(36.48, 0, 0), x_dir=(0, 0, -1), z_dir=(1, 0, 0))):
            with BuildLine():
                Line((27.745000009, 46.90726415), (27.745000009, 42.855708683))
                ThreePointArc((27.745000009, 42.855708683), (29.21, 42.381486336), (30.674999991, 42.855708683))
                Line((30.674999991, 42.855708683), (30.674999991, 46.90726415))
                ThreePointArc((30.674999991, 46.90726415), (29.21, 47.381486496), (27.745000009, 46.90726415))
            make_face()
        extrude(amount=-CUT_EXTRUDE6_DEPTH)


with BuildPart() as part_1:
    with SkipClean():  # the faces are left unmerged after this step: merging them gives an invalid solid
        add(part.part)

        # Cut-Extrude6: cut by cut_extrude6_tool
        add(cut_extrude6_tool.part, mode=Mode.SUBTRACT)

    # Sketch23 → Boss-Extrude6 (add)
    with SkipClean():  # the faces are left unmerged after this step: merging them gives an invalid solid
        with BuildSketch(Plane.ZY.offset(36.48).offset(BOSS_EXTRUDE6_START)):
            with Locations((-29.21, 44.881486416)):
                Circle(SKETCH23_R)
            with Locations((-29.21, 44.881486416)):
                Circle(SKETCH23_R_2, mode=Mode.SUBTRACT)
        extrude(amount=-BOSS_EXTRUDE6_DEPTH)

    # Sketch25 → Boss-Extrude7 (add)
    with SkipClean():  # the faces are left unmerged after this step: merging them gives an invalid solid
        with BuildSketch(Plane.ZY.offset(36.48)):
            with Locations((-29.21, 44.881486416)):
                Circle(SKETCH25_R)
            with Locations((-29.21, 44.881486416)):
                Circle(SKETCH25_R_2, mode=Mode.SUBTRACT)
        extrude(amount=BOSS_EXTRUDE7_DEPTH)

    # Sketch27 → Cut-Extrude7 (cut)
    with SkipClean():  # the faces are left unmerged after this step: merging them gives an invalid solid
        with BuildSketch(Plane(origin=(0, 0, -40.64), x_dir=(-1, 0, 0), z_dir=(0, 0, -1))):
            with Locations((43.980000034, 44.881486416)):
                Circle(SKETCH27_R)
        extrude(amount=-CUT_EXTRUDE7_DEPTH, mode=Mode.SUBTRACT)

    # Fillet6
    fillet6_edges = [part_1.edges().sort_by_distance(p)[0] for p in [
        (-32.585448492, 46.308877289, 8.89),
        (-9.205484653, 26.375622927, 8.89),
        (9.304936493, 26.342971235, 8.89),
        (0.10450601, 27.864681788, 8.89),
        (32.585448492, 46.308877289, 8.89),
        (0, 61.803367034, 8.89),
    ]]
    fillet(fillet6_edges, radius=FILLET6_R)


with BuildPart() as body_2_1:
    with SkipClean():  # the faces are left unmerged after this step: merging them gives an invalid solid
        add(body_2.part)

        # Cut-Extrude6: cut by cut_extrude6_tool
        add(cut_extrude6_tool.part, mode=Mode.SUBTRACT)


solid = Compound([part_1.part, body_2_1.part])
